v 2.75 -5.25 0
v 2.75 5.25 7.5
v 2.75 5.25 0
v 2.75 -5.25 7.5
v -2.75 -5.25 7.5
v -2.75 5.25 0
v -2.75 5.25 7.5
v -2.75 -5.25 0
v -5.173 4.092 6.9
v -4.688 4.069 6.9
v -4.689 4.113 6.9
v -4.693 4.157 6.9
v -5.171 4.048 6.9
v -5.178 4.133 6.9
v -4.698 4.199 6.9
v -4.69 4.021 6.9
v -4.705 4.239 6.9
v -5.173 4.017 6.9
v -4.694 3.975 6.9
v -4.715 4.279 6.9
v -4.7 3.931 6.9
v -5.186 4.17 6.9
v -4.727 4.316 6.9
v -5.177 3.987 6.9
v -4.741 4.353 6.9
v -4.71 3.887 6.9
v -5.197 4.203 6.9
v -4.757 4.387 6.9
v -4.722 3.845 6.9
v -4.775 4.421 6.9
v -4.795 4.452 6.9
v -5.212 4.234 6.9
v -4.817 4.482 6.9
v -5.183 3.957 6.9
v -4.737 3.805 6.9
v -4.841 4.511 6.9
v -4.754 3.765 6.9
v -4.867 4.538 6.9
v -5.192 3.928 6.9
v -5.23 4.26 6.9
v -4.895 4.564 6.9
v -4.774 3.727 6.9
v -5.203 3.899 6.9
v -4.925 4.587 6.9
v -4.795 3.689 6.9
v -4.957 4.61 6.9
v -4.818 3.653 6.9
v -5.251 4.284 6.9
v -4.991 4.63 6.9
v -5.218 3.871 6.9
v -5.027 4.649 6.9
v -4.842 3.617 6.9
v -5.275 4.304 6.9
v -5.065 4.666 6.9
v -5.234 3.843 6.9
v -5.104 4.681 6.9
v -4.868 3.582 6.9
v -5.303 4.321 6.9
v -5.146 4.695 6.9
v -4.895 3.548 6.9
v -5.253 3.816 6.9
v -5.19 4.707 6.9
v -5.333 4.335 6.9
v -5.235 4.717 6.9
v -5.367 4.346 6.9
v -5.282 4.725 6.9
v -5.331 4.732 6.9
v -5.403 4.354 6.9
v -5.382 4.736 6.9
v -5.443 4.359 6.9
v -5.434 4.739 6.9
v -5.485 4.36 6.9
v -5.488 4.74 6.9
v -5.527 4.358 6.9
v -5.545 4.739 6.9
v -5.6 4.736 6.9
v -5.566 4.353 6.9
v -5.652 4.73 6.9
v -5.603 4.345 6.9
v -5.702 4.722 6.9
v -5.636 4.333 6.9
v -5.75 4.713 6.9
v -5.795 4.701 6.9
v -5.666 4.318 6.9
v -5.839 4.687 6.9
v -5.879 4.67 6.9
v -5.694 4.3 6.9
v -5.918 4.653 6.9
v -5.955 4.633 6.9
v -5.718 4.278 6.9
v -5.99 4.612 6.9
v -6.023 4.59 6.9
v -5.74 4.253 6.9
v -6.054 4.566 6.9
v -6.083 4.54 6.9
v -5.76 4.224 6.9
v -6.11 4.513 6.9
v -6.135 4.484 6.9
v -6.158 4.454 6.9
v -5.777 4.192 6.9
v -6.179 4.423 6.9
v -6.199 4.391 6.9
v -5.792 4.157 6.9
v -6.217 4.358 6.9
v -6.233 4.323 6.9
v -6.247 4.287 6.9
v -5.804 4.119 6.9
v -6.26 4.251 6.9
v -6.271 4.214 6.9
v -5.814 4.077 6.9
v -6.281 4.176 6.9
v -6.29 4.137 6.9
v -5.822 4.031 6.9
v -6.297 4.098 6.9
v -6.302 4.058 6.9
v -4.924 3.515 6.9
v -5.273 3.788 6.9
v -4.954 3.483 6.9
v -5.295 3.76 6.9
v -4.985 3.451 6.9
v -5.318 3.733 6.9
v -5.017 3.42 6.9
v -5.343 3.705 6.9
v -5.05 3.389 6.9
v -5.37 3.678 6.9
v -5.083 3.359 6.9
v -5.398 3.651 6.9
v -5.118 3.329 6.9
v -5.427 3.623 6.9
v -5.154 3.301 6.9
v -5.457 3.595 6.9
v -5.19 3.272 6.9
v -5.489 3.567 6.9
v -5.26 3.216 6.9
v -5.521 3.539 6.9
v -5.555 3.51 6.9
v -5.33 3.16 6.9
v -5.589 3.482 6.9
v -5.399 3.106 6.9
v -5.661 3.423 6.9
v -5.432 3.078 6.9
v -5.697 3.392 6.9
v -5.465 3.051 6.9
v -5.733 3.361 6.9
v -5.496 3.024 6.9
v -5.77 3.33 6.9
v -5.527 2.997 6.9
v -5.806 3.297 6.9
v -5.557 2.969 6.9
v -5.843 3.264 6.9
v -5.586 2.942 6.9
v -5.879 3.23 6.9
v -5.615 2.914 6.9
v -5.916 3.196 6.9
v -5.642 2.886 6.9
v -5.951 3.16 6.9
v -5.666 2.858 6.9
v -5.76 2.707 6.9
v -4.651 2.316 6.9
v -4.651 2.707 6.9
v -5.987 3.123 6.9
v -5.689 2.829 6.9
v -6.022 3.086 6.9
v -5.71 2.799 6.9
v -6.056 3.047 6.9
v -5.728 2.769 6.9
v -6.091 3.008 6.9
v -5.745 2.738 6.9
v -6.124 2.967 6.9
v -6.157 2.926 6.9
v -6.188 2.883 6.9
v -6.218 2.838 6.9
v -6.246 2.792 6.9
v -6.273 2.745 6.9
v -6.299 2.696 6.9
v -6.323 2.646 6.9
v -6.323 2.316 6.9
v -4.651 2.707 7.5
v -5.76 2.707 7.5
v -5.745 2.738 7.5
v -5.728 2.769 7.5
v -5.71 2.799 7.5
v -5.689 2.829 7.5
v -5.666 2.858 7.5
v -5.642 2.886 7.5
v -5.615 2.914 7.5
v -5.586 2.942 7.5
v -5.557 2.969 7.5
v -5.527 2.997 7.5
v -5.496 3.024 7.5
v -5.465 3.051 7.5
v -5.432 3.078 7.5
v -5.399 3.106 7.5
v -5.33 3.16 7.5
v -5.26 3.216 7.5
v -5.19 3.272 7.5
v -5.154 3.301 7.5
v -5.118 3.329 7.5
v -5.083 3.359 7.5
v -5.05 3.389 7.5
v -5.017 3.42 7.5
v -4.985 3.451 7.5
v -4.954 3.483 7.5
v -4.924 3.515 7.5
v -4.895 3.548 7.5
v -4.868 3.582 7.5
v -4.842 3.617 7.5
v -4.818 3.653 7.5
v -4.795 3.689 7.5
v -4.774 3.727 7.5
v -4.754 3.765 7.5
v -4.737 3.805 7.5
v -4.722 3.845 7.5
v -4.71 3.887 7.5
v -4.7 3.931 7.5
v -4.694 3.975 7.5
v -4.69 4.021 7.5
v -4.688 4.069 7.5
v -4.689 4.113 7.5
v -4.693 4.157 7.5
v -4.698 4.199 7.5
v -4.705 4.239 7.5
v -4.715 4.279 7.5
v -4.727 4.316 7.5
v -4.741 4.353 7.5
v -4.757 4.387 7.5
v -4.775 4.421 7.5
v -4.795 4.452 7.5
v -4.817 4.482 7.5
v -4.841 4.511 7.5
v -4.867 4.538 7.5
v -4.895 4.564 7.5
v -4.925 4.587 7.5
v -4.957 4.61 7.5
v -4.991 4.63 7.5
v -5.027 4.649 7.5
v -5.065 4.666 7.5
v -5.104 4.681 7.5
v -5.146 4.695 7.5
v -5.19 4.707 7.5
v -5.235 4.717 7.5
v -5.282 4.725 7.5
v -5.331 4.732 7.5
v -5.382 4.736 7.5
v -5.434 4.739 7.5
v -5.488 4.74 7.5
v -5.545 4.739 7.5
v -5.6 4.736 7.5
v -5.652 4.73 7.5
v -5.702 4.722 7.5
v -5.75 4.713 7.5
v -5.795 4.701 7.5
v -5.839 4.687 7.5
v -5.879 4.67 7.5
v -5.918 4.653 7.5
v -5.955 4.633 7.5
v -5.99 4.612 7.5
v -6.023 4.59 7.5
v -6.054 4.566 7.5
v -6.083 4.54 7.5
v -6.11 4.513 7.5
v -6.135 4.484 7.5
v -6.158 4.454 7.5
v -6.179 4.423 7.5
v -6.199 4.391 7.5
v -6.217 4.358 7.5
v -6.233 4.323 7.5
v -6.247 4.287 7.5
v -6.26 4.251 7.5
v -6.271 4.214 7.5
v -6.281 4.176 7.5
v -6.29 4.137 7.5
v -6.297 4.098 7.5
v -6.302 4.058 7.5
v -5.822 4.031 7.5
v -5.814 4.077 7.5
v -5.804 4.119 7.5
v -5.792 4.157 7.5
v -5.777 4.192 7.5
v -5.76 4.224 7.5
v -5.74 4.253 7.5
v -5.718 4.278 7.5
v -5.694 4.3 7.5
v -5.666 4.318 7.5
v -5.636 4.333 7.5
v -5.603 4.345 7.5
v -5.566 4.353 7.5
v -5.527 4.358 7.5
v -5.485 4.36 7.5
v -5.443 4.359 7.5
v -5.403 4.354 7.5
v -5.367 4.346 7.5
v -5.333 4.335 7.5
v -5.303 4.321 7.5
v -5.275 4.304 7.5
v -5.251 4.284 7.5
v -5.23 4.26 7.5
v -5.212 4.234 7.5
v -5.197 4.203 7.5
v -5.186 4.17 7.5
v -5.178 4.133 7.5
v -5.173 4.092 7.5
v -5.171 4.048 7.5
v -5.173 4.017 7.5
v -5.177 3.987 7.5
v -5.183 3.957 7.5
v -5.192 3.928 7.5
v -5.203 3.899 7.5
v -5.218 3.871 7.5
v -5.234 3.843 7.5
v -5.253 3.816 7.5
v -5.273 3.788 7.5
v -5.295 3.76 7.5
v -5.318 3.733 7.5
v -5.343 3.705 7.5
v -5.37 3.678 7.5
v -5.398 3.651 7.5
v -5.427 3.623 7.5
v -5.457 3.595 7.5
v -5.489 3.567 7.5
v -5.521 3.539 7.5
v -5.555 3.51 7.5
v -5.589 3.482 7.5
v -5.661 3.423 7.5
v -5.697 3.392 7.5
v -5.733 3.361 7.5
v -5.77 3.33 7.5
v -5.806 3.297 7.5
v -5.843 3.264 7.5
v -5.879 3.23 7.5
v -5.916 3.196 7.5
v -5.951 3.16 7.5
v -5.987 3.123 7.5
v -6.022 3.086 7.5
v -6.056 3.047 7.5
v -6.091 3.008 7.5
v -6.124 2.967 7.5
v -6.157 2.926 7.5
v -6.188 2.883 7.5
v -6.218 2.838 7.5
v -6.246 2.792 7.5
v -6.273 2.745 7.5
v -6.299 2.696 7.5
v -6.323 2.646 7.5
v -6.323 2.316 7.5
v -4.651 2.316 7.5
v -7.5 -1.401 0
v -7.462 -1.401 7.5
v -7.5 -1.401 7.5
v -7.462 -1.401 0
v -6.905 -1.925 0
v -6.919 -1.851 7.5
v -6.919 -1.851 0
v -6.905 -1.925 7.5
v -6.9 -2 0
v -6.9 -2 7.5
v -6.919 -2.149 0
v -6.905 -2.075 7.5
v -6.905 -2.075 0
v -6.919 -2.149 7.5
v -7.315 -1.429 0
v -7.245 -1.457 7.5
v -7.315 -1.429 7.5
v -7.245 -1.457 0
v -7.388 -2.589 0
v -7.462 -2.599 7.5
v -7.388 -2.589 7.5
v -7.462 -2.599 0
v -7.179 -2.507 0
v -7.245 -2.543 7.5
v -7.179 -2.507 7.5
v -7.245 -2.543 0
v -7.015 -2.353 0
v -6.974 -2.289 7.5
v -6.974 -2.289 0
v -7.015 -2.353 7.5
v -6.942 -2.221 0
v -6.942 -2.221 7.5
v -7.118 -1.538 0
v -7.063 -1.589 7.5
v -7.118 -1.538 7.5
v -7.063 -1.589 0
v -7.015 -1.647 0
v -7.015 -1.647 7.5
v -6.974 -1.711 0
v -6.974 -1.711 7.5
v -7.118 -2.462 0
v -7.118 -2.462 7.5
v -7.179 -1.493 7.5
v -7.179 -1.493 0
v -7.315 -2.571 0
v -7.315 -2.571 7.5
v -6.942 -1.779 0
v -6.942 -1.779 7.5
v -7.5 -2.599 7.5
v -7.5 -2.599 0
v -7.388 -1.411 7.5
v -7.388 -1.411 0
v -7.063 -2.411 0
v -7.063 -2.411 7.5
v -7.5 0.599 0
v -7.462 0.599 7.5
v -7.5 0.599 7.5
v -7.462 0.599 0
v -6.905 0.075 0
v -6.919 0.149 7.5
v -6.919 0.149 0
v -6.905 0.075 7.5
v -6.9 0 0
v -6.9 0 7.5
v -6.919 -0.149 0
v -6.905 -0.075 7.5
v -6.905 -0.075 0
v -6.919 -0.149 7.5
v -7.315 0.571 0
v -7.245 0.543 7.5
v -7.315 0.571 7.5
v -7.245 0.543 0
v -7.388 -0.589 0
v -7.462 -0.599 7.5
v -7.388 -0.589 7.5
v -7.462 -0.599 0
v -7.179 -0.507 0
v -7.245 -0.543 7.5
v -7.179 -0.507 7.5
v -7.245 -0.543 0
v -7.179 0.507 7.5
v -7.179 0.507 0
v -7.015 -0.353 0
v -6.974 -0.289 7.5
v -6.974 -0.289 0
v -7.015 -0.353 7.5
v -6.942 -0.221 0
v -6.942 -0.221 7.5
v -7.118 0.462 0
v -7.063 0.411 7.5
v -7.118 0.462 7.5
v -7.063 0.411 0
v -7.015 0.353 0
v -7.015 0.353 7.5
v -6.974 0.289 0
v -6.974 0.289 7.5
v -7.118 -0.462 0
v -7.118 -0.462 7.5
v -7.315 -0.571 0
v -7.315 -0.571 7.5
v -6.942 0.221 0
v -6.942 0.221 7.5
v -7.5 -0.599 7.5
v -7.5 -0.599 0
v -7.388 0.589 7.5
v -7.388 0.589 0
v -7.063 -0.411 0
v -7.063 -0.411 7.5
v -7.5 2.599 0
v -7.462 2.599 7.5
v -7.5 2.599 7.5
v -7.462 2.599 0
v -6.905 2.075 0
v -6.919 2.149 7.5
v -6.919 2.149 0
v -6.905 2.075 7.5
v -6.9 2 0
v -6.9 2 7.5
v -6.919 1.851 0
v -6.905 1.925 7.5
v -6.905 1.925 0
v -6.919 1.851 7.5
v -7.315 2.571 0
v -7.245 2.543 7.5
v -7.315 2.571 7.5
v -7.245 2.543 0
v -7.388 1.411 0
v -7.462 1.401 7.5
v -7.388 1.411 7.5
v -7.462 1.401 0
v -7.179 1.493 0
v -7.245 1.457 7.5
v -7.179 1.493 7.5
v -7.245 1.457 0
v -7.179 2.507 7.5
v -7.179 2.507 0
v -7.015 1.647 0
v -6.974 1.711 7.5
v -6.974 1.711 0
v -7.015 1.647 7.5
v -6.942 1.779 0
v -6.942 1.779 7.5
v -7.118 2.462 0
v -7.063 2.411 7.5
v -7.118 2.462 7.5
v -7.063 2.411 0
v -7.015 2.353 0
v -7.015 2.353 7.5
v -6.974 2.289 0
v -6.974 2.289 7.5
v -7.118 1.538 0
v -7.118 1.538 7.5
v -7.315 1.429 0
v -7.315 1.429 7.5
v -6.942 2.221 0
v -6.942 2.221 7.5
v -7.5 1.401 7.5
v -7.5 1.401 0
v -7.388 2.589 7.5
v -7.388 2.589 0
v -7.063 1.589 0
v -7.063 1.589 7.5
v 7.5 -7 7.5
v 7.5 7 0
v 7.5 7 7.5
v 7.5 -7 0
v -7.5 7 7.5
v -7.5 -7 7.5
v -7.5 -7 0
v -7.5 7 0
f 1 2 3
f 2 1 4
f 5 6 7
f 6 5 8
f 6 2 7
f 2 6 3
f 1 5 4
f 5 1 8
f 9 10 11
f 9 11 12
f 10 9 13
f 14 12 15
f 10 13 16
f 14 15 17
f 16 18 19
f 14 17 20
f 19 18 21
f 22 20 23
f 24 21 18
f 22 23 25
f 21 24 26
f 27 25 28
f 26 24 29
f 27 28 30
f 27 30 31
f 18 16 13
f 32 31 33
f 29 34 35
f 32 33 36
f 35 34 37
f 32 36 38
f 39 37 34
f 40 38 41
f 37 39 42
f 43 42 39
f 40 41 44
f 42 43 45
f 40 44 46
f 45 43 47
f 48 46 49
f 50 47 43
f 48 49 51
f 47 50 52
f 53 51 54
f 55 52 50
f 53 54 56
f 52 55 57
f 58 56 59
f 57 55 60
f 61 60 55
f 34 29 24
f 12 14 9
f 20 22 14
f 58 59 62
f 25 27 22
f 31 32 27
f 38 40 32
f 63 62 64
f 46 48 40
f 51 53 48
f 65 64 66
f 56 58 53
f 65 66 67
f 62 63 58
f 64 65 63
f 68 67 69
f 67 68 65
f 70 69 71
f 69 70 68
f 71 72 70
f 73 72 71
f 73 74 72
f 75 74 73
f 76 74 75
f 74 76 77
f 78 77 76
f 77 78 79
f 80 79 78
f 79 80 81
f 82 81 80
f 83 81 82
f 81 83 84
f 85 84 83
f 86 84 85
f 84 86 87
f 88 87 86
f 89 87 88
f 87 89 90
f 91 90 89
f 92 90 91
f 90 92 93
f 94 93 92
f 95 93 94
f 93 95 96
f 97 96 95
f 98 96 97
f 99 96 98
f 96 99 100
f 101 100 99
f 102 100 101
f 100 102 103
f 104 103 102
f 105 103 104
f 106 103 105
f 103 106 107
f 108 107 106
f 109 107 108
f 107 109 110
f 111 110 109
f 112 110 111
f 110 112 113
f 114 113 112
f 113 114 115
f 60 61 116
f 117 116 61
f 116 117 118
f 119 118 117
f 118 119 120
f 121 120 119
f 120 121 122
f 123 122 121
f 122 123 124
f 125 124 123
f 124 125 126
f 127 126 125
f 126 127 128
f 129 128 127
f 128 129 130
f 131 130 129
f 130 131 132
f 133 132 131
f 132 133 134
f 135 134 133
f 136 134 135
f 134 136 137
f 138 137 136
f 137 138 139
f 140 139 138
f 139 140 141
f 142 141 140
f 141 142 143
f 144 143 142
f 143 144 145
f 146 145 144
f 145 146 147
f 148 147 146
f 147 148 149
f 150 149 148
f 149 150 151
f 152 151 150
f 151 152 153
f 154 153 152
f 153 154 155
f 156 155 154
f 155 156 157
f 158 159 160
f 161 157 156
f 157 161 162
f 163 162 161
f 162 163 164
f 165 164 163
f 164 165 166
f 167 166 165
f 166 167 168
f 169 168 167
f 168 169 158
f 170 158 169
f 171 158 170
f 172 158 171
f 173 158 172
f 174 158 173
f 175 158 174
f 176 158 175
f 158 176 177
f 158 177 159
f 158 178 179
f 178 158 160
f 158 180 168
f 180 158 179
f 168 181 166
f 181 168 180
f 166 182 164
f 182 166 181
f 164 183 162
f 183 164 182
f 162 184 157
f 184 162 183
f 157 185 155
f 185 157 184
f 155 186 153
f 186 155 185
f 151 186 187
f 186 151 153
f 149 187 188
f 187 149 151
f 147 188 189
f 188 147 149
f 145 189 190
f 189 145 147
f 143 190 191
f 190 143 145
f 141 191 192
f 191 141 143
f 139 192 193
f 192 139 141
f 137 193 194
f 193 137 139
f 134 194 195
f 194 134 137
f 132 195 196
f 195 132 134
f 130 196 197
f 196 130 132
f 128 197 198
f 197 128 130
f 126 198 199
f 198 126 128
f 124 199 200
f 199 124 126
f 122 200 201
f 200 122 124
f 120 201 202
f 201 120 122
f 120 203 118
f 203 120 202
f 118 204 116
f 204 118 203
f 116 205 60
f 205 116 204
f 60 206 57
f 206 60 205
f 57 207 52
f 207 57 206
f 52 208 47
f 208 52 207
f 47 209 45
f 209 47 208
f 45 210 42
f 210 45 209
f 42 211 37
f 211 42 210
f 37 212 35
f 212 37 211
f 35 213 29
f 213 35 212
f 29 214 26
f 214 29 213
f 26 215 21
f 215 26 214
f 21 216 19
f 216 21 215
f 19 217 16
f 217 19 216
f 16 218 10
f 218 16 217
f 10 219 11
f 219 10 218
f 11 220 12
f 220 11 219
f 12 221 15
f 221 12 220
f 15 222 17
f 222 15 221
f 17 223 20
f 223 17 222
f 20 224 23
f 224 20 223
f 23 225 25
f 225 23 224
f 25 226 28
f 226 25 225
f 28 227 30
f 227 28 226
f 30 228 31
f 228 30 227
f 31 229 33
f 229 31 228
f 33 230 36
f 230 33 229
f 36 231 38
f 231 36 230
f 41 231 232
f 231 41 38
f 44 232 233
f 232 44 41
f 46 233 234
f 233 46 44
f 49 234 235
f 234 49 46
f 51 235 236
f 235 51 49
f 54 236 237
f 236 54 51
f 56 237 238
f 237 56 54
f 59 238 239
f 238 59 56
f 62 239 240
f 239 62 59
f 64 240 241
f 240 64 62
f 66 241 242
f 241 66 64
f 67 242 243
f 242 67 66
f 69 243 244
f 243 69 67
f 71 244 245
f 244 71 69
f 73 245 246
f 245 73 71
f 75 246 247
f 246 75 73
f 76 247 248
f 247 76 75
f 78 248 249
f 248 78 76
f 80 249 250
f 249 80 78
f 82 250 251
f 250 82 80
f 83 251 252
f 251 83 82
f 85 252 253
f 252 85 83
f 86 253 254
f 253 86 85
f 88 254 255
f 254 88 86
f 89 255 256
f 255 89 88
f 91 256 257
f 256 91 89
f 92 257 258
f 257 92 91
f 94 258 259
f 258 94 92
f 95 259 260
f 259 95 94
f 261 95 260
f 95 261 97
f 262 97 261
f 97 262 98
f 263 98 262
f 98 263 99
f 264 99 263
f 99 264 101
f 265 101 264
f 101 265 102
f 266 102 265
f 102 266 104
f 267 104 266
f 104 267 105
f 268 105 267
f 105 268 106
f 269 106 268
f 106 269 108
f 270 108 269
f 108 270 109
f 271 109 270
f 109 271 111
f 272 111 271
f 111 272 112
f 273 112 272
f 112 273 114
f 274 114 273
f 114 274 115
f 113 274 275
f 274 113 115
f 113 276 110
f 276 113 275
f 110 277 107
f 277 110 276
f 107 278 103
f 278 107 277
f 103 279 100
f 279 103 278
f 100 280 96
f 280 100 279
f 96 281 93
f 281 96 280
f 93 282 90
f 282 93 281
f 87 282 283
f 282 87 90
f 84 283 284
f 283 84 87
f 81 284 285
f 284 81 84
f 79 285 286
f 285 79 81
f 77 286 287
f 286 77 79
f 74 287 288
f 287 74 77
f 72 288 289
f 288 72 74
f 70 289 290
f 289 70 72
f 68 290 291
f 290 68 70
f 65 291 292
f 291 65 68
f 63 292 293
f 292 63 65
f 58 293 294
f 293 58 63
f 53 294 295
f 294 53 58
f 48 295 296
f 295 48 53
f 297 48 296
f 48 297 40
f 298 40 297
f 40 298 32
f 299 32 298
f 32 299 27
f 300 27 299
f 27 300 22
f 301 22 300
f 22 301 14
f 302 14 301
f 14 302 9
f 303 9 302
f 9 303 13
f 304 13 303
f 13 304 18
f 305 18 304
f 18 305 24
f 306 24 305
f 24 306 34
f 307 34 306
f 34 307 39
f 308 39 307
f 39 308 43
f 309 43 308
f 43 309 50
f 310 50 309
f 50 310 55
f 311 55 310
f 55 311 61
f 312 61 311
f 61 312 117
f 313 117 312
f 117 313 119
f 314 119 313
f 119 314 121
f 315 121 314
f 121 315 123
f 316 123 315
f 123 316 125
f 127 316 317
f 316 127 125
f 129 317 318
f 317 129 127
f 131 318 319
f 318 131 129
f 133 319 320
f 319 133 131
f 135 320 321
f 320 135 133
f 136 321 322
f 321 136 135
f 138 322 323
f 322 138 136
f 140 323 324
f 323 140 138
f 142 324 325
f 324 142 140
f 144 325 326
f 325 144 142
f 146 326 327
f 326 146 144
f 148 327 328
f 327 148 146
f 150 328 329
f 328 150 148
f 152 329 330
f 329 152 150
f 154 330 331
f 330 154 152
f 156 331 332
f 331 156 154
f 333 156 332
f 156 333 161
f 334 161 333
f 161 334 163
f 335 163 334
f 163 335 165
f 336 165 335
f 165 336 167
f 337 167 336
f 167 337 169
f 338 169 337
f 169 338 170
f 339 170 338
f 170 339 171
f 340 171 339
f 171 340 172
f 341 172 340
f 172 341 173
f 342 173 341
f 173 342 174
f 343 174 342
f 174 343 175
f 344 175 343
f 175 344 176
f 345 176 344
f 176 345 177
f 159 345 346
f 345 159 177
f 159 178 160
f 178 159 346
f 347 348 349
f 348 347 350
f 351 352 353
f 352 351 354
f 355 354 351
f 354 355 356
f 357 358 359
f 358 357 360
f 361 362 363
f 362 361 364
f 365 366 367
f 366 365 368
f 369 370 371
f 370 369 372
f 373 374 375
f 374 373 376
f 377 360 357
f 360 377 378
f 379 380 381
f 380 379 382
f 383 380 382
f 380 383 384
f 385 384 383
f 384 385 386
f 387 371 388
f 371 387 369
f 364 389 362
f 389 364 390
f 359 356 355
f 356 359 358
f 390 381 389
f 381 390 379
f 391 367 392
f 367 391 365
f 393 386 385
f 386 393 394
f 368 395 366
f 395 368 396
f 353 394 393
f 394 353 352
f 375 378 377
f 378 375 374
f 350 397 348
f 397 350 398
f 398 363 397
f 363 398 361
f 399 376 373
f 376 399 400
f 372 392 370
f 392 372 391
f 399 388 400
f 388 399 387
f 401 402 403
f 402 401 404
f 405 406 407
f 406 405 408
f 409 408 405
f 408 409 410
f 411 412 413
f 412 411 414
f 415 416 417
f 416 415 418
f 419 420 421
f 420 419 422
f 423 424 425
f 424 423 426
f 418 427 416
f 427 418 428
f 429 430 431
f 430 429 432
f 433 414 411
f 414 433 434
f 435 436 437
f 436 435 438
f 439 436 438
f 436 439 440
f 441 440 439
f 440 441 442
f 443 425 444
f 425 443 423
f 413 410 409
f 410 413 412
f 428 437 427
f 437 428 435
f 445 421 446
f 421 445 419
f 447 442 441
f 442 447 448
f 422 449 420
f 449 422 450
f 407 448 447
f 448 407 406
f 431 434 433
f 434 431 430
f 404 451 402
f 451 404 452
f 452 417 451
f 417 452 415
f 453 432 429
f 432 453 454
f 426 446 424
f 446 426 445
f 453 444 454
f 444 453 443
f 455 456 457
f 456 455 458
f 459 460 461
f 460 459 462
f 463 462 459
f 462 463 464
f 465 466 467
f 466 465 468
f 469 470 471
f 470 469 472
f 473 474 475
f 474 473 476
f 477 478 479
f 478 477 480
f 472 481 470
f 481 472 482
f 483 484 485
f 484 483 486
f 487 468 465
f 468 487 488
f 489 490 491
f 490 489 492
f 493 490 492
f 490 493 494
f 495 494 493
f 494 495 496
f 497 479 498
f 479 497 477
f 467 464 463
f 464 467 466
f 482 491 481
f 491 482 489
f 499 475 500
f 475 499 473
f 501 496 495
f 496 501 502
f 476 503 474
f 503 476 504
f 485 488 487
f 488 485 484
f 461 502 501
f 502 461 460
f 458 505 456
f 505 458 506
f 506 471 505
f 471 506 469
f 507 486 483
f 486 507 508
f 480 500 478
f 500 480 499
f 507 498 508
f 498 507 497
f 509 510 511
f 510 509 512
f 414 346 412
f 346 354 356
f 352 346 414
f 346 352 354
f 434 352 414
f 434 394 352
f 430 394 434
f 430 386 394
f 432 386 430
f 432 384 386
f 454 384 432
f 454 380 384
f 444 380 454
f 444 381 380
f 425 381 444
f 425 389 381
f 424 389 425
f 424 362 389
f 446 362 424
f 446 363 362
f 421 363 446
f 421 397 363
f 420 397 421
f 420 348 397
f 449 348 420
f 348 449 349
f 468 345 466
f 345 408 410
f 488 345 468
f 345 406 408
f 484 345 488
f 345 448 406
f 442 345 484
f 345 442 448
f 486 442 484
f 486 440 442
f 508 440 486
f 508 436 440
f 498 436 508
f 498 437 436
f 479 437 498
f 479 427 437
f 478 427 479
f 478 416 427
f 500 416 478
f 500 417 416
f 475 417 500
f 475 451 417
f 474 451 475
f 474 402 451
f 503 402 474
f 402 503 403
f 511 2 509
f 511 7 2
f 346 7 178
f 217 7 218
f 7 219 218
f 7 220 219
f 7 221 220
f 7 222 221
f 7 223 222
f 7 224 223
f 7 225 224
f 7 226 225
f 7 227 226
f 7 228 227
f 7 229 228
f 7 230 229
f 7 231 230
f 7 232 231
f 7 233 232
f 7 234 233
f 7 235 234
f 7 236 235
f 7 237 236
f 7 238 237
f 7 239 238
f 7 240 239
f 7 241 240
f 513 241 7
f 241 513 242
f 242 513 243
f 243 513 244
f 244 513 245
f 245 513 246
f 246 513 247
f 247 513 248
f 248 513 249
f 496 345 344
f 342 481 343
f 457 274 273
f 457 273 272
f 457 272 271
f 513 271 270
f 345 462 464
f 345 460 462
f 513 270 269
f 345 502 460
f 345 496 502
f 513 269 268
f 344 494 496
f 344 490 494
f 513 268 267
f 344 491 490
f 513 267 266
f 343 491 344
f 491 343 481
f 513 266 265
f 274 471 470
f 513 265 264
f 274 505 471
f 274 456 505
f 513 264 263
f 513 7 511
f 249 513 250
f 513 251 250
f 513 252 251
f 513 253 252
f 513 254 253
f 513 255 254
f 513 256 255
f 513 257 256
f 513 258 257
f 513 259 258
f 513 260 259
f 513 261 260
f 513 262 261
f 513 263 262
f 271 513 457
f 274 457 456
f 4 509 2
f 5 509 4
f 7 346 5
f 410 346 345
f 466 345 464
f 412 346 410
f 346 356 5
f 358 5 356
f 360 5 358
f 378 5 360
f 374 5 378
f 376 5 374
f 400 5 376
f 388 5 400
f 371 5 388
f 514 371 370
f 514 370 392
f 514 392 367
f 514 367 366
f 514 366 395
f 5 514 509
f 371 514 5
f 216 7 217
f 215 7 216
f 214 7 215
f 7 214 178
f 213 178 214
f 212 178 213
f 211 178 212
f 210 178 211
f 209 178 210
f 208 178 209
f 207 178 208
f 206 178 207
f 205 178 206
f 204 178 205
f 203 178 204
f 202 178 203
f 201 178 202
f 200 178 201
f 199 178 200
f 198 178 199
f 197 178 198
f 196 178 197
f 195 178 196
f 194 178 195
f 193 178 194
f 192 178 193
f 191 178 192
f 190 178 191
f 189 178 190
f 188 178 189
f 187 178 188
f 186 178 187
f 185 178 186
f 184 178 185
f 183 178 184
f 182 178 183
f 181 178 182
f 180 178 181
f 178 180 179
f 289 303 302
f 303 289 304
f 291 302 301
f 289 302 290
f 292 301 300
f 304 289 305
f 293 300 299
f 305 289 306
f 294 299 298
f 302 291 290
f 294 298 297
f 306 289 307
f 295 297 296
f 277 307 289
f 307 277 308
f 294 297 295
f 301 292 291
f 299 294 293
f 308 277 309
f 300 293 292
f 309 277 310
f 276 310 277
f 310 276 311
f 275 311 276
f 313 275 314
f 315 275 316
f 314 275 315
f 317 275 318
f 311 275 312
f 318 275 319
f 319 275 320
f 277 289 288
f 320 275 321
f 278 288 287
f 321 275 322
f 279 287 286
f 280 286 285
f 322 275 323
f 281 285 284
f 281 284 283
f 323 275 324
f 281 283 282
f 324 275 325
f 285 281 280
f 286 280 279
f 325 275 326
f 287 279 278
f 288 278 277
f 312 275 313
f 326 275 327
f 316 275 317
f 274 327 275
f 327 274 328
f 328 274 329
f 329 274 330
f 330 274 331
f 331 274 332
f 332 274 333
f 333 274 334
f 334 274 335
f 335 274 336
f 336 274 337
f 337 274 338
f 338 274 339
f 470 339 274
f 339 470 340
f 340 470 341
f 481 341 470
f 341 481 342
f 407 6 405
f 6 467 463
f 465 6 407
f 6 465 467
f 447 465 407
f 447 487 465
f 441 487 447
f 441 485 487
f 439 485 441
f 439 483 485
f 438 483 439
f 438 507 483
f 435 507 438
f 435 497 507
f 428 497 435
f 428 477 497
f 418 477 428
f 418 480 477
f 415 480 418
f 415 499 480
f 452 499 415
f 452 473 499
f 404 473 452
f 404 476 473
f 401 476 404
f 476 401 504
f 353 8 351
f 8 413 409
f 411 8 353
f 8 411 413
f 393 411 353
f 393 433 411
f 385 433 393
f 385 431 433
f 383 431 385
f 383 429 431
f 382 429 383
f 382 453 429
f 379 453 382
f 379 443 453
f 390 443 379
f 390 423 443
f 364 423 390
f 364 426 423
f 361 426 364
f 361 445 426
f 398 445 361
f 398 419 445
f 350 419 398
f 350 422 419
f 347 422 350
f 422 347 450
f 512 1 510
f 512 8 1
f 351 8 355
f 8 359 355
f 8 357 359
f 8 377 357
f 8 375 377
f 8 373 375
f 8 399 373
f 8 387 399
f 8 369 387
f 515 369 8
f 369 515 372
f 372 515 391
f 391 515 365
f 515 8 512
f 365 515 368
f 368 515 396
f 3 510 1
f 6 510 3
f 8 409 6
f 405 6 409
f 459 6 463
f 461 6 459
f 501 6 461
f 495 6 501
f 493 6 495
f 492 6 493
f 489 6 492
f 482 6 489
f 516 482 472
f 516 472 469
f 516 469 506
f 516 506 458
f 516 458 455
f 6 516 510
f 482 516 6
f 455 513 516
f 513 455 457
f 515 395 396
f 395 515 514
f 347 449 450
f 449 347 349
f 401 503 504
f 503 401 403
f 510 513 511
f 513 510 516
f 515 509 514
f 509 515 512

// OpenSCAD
$fn = 50;

difference() {
	union() {
		translate(v = [0, -5, 0]) {
			rotate(a = [0, 0, 0]) {
				difference() {
					union() {
						translate(v = [-7.5, -2.0, 0]) {
							cube(size = [15.0, 14.0, 7.5]);
						}
					}
					union() {
						translate(v = [-2.75, -0.25, -0.1]) {
							cube(size = [5.5, 10.5, 7.7]);
						}
						translate(v = [-5.5, 8.5, 6.9]) {
							linear_extrude(height = 0.7) {
								text(font = "Arial:style=Bold", halign = "center", size = 2.5, text = "2", valign = "center");
							}
						}
						translate(v = [-7.5, 3, -0.1]) {
							cylinder(h = 7.7, r = 0.6);
						}
						translate(v = [-7.5, 5, -0.1]) {
							cylinder(h = 7.7, r = 0.6);
						}
						translate(v = [-7.5, 7, -0.1]) {
							cylinder(h = 7.7, r = 0.6);
						}
					}
				}
			}
		}
	}
	union();
}
